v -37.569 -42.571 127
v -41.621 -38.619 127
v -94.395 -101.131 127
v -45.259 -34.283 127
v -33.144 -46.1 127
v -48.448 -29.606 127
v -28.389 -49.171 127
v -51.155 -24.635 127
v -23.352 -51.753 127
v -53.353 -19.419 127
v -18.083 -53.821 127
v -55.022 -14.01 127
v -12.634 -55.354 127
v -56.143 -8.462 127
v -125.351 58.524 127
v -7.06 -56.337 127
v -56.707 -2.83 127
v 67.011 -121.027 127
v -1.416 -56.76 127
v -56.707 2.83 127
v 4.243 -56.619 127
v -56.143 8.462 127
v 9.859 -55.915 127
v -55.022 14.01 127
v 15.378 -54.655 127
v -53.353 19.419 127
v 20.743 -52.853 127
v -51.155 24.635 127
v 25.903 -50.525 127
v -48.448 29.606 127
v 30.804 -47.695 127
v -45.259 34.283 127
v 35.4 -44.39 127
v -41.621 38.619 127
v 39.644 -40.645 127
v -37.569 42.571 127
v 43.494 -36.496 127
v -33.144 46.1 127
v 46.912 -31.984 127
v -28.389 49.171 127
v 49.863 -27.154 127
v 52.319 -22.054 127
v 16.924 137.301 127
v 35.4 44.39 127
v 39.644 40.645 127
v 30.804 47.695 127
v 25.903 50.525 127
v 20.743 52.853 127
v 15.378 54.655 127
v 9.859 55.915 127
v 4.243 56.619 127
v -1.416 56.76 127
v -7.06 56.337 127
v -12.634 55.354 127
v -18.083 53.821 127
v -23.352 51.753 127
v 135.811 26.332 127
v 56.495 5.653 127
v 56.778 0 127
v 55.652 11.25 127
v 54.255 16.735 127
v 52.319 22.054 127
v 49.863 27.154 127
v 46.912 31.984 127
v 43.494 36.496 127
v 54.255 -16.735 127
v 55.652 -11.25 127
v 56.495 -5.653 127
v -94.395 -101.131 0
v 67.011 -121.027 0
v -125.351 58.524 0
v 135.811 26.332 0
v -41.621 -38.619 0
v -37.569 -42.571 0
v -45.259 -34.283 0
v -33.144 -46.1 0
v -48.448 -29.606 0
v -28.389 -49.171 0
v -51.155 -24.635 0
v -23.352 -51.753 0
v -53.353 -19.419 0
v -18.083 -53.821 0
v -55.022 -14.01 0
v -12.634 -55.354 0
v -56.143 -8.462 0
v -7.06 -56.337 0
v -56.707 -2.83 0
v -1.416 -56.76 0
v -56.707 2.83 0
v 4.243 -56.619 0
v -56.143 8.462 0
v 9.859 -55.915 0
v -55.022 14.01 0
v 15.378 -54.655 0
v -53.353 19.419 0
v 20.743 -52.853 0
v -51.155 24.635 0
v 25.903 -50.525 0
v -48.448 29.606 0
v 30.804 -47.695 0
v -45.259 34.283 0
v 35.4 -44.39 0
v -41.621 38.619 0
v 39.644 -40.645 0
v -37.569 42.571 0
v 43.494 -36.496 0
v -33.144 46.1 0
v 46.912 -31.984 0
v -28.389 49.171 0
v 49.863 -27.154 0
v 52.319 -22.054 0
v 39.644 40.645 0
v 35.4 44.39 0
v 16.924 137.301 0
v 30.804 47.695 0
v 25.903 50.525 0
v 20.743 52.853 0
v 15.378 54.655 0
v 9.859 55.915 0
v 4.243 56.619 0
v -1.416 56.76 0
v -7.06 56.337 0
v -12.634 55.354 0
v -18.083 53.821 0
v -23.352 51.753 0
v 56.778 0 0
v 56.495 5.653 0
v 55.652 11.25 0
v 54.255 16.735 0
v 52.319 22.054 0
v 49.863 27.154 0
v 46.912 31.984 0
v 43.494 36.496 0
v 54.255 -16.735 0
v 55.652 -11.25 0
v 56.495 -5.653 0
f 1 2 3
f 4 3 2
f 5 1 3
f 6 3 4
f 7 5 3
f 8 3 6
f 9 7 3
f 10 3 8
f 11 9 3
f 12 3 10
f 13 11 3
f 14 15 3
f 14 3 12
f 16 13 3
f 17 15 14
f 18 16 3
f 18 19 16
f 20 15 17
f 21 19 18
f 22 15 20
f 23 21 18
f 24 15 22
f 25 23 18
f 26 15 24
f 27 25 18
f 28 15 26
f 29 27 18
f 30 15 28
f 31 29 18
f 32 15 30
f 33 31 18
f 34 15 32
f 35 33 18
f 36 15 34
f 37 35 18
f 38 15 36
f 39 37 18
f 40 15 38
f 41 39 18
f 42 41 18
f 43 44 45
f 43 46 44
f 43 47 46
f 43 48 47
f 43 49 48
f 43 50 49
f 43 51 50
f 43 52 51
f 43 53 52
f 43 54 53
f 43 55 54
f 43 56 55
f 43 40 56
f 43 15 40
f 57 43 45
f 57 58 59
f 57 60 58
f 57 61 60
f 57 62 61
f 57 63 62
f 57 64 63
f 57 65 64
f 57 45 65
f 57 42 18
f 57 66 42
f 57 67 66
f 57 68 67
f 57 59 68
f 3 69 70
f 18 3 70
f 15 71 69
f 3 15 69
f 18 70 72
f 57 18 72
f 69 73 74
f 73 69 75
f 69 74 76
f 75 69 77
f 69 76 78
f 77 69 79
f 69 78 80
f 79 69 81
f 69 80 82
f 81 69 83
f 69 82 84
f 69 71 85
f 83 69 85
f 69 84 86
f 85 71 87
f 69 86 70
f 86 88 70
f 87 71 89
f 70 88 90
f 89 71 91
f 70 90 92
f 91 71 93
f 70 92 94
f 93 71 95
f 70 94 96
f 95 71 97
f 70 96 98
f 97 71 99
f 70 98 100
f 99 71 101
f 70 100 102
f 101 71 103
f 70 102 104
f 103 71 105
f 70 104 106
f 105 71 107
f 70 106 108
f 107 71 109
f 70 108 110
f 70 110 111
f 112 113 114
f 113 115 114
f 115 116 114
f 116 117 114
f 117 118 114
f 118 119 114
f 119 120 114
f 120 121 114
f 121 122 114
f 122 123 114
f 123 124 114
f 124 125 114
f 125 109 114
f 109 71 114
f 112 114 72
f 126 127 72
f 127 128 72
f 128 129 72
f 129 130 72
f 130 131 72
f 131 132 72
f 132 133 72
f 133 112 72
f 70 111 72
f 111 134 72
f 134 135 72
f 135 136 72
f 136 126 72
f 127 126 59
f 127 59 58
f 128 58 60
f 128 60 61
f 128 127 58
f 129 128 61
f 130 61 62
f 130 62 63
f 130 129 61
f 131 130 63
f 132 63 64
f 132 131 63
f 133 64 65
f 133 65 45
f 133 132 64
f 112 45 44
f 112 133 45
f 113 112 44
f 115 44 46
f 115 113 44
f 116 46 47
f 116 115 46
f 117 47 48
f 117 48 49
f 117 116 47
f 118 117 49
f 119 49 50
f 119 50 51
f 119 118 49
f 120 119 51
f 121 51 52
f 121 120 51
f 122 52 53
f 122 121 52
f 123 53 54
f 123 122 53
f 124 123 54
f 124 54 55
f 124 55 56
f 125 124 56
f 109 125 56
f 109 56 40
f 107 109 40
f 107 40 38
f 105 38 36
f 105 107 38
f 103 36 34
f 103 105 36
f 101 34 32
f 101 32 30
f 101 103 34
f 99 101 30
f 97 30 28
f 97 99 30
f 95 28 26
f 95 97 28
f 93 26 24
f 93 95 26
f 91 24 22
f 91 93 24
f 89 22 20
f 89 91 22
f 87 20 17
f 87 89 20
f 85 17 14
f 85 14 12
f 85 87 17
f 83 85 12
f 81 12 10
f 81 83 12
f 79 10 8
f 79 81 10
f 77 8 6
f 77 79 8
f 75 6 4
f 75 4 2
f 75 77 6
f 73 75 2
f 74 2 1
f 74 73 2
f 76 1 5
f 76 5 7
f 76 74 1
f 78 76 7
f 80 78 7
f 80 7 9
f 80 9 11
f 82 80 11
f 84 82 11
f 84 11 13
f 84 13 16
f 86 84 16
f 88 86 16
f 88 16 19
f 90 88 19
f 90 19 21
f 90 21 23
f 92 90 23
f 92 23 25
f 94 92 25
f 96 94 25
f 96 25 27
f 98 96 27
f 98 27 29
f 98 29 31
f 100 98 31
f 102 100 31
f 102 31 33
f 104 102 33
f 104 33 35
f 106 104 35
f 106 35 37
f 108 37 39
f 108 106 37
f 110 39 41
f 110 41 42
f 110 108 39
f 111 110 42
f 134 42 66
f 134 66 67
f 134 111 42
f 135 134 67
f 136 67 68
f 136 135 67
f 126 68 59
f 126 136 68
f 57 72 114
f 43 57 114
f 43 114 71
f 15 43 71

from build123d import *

# Parameters (mm, degrees)
F0_R     = 56.77758
F1_DEPTH = 127


with BuildPart() as f1:
    # F0 (on Top) → F1 (new body)
    with BuildSketch(Plane.XY):
        Polygon((16.924353, 137.300746), (-125.350856, 58.52428), (-94.395442, -101.130752), (67.011265, -121.026522), (135.810682, 26.332248), align=None)
        Circle(F0_R, mode=Mode.SUBTRACT)
    extrude(amount=F1_DEPTH)


solid = f1.part
